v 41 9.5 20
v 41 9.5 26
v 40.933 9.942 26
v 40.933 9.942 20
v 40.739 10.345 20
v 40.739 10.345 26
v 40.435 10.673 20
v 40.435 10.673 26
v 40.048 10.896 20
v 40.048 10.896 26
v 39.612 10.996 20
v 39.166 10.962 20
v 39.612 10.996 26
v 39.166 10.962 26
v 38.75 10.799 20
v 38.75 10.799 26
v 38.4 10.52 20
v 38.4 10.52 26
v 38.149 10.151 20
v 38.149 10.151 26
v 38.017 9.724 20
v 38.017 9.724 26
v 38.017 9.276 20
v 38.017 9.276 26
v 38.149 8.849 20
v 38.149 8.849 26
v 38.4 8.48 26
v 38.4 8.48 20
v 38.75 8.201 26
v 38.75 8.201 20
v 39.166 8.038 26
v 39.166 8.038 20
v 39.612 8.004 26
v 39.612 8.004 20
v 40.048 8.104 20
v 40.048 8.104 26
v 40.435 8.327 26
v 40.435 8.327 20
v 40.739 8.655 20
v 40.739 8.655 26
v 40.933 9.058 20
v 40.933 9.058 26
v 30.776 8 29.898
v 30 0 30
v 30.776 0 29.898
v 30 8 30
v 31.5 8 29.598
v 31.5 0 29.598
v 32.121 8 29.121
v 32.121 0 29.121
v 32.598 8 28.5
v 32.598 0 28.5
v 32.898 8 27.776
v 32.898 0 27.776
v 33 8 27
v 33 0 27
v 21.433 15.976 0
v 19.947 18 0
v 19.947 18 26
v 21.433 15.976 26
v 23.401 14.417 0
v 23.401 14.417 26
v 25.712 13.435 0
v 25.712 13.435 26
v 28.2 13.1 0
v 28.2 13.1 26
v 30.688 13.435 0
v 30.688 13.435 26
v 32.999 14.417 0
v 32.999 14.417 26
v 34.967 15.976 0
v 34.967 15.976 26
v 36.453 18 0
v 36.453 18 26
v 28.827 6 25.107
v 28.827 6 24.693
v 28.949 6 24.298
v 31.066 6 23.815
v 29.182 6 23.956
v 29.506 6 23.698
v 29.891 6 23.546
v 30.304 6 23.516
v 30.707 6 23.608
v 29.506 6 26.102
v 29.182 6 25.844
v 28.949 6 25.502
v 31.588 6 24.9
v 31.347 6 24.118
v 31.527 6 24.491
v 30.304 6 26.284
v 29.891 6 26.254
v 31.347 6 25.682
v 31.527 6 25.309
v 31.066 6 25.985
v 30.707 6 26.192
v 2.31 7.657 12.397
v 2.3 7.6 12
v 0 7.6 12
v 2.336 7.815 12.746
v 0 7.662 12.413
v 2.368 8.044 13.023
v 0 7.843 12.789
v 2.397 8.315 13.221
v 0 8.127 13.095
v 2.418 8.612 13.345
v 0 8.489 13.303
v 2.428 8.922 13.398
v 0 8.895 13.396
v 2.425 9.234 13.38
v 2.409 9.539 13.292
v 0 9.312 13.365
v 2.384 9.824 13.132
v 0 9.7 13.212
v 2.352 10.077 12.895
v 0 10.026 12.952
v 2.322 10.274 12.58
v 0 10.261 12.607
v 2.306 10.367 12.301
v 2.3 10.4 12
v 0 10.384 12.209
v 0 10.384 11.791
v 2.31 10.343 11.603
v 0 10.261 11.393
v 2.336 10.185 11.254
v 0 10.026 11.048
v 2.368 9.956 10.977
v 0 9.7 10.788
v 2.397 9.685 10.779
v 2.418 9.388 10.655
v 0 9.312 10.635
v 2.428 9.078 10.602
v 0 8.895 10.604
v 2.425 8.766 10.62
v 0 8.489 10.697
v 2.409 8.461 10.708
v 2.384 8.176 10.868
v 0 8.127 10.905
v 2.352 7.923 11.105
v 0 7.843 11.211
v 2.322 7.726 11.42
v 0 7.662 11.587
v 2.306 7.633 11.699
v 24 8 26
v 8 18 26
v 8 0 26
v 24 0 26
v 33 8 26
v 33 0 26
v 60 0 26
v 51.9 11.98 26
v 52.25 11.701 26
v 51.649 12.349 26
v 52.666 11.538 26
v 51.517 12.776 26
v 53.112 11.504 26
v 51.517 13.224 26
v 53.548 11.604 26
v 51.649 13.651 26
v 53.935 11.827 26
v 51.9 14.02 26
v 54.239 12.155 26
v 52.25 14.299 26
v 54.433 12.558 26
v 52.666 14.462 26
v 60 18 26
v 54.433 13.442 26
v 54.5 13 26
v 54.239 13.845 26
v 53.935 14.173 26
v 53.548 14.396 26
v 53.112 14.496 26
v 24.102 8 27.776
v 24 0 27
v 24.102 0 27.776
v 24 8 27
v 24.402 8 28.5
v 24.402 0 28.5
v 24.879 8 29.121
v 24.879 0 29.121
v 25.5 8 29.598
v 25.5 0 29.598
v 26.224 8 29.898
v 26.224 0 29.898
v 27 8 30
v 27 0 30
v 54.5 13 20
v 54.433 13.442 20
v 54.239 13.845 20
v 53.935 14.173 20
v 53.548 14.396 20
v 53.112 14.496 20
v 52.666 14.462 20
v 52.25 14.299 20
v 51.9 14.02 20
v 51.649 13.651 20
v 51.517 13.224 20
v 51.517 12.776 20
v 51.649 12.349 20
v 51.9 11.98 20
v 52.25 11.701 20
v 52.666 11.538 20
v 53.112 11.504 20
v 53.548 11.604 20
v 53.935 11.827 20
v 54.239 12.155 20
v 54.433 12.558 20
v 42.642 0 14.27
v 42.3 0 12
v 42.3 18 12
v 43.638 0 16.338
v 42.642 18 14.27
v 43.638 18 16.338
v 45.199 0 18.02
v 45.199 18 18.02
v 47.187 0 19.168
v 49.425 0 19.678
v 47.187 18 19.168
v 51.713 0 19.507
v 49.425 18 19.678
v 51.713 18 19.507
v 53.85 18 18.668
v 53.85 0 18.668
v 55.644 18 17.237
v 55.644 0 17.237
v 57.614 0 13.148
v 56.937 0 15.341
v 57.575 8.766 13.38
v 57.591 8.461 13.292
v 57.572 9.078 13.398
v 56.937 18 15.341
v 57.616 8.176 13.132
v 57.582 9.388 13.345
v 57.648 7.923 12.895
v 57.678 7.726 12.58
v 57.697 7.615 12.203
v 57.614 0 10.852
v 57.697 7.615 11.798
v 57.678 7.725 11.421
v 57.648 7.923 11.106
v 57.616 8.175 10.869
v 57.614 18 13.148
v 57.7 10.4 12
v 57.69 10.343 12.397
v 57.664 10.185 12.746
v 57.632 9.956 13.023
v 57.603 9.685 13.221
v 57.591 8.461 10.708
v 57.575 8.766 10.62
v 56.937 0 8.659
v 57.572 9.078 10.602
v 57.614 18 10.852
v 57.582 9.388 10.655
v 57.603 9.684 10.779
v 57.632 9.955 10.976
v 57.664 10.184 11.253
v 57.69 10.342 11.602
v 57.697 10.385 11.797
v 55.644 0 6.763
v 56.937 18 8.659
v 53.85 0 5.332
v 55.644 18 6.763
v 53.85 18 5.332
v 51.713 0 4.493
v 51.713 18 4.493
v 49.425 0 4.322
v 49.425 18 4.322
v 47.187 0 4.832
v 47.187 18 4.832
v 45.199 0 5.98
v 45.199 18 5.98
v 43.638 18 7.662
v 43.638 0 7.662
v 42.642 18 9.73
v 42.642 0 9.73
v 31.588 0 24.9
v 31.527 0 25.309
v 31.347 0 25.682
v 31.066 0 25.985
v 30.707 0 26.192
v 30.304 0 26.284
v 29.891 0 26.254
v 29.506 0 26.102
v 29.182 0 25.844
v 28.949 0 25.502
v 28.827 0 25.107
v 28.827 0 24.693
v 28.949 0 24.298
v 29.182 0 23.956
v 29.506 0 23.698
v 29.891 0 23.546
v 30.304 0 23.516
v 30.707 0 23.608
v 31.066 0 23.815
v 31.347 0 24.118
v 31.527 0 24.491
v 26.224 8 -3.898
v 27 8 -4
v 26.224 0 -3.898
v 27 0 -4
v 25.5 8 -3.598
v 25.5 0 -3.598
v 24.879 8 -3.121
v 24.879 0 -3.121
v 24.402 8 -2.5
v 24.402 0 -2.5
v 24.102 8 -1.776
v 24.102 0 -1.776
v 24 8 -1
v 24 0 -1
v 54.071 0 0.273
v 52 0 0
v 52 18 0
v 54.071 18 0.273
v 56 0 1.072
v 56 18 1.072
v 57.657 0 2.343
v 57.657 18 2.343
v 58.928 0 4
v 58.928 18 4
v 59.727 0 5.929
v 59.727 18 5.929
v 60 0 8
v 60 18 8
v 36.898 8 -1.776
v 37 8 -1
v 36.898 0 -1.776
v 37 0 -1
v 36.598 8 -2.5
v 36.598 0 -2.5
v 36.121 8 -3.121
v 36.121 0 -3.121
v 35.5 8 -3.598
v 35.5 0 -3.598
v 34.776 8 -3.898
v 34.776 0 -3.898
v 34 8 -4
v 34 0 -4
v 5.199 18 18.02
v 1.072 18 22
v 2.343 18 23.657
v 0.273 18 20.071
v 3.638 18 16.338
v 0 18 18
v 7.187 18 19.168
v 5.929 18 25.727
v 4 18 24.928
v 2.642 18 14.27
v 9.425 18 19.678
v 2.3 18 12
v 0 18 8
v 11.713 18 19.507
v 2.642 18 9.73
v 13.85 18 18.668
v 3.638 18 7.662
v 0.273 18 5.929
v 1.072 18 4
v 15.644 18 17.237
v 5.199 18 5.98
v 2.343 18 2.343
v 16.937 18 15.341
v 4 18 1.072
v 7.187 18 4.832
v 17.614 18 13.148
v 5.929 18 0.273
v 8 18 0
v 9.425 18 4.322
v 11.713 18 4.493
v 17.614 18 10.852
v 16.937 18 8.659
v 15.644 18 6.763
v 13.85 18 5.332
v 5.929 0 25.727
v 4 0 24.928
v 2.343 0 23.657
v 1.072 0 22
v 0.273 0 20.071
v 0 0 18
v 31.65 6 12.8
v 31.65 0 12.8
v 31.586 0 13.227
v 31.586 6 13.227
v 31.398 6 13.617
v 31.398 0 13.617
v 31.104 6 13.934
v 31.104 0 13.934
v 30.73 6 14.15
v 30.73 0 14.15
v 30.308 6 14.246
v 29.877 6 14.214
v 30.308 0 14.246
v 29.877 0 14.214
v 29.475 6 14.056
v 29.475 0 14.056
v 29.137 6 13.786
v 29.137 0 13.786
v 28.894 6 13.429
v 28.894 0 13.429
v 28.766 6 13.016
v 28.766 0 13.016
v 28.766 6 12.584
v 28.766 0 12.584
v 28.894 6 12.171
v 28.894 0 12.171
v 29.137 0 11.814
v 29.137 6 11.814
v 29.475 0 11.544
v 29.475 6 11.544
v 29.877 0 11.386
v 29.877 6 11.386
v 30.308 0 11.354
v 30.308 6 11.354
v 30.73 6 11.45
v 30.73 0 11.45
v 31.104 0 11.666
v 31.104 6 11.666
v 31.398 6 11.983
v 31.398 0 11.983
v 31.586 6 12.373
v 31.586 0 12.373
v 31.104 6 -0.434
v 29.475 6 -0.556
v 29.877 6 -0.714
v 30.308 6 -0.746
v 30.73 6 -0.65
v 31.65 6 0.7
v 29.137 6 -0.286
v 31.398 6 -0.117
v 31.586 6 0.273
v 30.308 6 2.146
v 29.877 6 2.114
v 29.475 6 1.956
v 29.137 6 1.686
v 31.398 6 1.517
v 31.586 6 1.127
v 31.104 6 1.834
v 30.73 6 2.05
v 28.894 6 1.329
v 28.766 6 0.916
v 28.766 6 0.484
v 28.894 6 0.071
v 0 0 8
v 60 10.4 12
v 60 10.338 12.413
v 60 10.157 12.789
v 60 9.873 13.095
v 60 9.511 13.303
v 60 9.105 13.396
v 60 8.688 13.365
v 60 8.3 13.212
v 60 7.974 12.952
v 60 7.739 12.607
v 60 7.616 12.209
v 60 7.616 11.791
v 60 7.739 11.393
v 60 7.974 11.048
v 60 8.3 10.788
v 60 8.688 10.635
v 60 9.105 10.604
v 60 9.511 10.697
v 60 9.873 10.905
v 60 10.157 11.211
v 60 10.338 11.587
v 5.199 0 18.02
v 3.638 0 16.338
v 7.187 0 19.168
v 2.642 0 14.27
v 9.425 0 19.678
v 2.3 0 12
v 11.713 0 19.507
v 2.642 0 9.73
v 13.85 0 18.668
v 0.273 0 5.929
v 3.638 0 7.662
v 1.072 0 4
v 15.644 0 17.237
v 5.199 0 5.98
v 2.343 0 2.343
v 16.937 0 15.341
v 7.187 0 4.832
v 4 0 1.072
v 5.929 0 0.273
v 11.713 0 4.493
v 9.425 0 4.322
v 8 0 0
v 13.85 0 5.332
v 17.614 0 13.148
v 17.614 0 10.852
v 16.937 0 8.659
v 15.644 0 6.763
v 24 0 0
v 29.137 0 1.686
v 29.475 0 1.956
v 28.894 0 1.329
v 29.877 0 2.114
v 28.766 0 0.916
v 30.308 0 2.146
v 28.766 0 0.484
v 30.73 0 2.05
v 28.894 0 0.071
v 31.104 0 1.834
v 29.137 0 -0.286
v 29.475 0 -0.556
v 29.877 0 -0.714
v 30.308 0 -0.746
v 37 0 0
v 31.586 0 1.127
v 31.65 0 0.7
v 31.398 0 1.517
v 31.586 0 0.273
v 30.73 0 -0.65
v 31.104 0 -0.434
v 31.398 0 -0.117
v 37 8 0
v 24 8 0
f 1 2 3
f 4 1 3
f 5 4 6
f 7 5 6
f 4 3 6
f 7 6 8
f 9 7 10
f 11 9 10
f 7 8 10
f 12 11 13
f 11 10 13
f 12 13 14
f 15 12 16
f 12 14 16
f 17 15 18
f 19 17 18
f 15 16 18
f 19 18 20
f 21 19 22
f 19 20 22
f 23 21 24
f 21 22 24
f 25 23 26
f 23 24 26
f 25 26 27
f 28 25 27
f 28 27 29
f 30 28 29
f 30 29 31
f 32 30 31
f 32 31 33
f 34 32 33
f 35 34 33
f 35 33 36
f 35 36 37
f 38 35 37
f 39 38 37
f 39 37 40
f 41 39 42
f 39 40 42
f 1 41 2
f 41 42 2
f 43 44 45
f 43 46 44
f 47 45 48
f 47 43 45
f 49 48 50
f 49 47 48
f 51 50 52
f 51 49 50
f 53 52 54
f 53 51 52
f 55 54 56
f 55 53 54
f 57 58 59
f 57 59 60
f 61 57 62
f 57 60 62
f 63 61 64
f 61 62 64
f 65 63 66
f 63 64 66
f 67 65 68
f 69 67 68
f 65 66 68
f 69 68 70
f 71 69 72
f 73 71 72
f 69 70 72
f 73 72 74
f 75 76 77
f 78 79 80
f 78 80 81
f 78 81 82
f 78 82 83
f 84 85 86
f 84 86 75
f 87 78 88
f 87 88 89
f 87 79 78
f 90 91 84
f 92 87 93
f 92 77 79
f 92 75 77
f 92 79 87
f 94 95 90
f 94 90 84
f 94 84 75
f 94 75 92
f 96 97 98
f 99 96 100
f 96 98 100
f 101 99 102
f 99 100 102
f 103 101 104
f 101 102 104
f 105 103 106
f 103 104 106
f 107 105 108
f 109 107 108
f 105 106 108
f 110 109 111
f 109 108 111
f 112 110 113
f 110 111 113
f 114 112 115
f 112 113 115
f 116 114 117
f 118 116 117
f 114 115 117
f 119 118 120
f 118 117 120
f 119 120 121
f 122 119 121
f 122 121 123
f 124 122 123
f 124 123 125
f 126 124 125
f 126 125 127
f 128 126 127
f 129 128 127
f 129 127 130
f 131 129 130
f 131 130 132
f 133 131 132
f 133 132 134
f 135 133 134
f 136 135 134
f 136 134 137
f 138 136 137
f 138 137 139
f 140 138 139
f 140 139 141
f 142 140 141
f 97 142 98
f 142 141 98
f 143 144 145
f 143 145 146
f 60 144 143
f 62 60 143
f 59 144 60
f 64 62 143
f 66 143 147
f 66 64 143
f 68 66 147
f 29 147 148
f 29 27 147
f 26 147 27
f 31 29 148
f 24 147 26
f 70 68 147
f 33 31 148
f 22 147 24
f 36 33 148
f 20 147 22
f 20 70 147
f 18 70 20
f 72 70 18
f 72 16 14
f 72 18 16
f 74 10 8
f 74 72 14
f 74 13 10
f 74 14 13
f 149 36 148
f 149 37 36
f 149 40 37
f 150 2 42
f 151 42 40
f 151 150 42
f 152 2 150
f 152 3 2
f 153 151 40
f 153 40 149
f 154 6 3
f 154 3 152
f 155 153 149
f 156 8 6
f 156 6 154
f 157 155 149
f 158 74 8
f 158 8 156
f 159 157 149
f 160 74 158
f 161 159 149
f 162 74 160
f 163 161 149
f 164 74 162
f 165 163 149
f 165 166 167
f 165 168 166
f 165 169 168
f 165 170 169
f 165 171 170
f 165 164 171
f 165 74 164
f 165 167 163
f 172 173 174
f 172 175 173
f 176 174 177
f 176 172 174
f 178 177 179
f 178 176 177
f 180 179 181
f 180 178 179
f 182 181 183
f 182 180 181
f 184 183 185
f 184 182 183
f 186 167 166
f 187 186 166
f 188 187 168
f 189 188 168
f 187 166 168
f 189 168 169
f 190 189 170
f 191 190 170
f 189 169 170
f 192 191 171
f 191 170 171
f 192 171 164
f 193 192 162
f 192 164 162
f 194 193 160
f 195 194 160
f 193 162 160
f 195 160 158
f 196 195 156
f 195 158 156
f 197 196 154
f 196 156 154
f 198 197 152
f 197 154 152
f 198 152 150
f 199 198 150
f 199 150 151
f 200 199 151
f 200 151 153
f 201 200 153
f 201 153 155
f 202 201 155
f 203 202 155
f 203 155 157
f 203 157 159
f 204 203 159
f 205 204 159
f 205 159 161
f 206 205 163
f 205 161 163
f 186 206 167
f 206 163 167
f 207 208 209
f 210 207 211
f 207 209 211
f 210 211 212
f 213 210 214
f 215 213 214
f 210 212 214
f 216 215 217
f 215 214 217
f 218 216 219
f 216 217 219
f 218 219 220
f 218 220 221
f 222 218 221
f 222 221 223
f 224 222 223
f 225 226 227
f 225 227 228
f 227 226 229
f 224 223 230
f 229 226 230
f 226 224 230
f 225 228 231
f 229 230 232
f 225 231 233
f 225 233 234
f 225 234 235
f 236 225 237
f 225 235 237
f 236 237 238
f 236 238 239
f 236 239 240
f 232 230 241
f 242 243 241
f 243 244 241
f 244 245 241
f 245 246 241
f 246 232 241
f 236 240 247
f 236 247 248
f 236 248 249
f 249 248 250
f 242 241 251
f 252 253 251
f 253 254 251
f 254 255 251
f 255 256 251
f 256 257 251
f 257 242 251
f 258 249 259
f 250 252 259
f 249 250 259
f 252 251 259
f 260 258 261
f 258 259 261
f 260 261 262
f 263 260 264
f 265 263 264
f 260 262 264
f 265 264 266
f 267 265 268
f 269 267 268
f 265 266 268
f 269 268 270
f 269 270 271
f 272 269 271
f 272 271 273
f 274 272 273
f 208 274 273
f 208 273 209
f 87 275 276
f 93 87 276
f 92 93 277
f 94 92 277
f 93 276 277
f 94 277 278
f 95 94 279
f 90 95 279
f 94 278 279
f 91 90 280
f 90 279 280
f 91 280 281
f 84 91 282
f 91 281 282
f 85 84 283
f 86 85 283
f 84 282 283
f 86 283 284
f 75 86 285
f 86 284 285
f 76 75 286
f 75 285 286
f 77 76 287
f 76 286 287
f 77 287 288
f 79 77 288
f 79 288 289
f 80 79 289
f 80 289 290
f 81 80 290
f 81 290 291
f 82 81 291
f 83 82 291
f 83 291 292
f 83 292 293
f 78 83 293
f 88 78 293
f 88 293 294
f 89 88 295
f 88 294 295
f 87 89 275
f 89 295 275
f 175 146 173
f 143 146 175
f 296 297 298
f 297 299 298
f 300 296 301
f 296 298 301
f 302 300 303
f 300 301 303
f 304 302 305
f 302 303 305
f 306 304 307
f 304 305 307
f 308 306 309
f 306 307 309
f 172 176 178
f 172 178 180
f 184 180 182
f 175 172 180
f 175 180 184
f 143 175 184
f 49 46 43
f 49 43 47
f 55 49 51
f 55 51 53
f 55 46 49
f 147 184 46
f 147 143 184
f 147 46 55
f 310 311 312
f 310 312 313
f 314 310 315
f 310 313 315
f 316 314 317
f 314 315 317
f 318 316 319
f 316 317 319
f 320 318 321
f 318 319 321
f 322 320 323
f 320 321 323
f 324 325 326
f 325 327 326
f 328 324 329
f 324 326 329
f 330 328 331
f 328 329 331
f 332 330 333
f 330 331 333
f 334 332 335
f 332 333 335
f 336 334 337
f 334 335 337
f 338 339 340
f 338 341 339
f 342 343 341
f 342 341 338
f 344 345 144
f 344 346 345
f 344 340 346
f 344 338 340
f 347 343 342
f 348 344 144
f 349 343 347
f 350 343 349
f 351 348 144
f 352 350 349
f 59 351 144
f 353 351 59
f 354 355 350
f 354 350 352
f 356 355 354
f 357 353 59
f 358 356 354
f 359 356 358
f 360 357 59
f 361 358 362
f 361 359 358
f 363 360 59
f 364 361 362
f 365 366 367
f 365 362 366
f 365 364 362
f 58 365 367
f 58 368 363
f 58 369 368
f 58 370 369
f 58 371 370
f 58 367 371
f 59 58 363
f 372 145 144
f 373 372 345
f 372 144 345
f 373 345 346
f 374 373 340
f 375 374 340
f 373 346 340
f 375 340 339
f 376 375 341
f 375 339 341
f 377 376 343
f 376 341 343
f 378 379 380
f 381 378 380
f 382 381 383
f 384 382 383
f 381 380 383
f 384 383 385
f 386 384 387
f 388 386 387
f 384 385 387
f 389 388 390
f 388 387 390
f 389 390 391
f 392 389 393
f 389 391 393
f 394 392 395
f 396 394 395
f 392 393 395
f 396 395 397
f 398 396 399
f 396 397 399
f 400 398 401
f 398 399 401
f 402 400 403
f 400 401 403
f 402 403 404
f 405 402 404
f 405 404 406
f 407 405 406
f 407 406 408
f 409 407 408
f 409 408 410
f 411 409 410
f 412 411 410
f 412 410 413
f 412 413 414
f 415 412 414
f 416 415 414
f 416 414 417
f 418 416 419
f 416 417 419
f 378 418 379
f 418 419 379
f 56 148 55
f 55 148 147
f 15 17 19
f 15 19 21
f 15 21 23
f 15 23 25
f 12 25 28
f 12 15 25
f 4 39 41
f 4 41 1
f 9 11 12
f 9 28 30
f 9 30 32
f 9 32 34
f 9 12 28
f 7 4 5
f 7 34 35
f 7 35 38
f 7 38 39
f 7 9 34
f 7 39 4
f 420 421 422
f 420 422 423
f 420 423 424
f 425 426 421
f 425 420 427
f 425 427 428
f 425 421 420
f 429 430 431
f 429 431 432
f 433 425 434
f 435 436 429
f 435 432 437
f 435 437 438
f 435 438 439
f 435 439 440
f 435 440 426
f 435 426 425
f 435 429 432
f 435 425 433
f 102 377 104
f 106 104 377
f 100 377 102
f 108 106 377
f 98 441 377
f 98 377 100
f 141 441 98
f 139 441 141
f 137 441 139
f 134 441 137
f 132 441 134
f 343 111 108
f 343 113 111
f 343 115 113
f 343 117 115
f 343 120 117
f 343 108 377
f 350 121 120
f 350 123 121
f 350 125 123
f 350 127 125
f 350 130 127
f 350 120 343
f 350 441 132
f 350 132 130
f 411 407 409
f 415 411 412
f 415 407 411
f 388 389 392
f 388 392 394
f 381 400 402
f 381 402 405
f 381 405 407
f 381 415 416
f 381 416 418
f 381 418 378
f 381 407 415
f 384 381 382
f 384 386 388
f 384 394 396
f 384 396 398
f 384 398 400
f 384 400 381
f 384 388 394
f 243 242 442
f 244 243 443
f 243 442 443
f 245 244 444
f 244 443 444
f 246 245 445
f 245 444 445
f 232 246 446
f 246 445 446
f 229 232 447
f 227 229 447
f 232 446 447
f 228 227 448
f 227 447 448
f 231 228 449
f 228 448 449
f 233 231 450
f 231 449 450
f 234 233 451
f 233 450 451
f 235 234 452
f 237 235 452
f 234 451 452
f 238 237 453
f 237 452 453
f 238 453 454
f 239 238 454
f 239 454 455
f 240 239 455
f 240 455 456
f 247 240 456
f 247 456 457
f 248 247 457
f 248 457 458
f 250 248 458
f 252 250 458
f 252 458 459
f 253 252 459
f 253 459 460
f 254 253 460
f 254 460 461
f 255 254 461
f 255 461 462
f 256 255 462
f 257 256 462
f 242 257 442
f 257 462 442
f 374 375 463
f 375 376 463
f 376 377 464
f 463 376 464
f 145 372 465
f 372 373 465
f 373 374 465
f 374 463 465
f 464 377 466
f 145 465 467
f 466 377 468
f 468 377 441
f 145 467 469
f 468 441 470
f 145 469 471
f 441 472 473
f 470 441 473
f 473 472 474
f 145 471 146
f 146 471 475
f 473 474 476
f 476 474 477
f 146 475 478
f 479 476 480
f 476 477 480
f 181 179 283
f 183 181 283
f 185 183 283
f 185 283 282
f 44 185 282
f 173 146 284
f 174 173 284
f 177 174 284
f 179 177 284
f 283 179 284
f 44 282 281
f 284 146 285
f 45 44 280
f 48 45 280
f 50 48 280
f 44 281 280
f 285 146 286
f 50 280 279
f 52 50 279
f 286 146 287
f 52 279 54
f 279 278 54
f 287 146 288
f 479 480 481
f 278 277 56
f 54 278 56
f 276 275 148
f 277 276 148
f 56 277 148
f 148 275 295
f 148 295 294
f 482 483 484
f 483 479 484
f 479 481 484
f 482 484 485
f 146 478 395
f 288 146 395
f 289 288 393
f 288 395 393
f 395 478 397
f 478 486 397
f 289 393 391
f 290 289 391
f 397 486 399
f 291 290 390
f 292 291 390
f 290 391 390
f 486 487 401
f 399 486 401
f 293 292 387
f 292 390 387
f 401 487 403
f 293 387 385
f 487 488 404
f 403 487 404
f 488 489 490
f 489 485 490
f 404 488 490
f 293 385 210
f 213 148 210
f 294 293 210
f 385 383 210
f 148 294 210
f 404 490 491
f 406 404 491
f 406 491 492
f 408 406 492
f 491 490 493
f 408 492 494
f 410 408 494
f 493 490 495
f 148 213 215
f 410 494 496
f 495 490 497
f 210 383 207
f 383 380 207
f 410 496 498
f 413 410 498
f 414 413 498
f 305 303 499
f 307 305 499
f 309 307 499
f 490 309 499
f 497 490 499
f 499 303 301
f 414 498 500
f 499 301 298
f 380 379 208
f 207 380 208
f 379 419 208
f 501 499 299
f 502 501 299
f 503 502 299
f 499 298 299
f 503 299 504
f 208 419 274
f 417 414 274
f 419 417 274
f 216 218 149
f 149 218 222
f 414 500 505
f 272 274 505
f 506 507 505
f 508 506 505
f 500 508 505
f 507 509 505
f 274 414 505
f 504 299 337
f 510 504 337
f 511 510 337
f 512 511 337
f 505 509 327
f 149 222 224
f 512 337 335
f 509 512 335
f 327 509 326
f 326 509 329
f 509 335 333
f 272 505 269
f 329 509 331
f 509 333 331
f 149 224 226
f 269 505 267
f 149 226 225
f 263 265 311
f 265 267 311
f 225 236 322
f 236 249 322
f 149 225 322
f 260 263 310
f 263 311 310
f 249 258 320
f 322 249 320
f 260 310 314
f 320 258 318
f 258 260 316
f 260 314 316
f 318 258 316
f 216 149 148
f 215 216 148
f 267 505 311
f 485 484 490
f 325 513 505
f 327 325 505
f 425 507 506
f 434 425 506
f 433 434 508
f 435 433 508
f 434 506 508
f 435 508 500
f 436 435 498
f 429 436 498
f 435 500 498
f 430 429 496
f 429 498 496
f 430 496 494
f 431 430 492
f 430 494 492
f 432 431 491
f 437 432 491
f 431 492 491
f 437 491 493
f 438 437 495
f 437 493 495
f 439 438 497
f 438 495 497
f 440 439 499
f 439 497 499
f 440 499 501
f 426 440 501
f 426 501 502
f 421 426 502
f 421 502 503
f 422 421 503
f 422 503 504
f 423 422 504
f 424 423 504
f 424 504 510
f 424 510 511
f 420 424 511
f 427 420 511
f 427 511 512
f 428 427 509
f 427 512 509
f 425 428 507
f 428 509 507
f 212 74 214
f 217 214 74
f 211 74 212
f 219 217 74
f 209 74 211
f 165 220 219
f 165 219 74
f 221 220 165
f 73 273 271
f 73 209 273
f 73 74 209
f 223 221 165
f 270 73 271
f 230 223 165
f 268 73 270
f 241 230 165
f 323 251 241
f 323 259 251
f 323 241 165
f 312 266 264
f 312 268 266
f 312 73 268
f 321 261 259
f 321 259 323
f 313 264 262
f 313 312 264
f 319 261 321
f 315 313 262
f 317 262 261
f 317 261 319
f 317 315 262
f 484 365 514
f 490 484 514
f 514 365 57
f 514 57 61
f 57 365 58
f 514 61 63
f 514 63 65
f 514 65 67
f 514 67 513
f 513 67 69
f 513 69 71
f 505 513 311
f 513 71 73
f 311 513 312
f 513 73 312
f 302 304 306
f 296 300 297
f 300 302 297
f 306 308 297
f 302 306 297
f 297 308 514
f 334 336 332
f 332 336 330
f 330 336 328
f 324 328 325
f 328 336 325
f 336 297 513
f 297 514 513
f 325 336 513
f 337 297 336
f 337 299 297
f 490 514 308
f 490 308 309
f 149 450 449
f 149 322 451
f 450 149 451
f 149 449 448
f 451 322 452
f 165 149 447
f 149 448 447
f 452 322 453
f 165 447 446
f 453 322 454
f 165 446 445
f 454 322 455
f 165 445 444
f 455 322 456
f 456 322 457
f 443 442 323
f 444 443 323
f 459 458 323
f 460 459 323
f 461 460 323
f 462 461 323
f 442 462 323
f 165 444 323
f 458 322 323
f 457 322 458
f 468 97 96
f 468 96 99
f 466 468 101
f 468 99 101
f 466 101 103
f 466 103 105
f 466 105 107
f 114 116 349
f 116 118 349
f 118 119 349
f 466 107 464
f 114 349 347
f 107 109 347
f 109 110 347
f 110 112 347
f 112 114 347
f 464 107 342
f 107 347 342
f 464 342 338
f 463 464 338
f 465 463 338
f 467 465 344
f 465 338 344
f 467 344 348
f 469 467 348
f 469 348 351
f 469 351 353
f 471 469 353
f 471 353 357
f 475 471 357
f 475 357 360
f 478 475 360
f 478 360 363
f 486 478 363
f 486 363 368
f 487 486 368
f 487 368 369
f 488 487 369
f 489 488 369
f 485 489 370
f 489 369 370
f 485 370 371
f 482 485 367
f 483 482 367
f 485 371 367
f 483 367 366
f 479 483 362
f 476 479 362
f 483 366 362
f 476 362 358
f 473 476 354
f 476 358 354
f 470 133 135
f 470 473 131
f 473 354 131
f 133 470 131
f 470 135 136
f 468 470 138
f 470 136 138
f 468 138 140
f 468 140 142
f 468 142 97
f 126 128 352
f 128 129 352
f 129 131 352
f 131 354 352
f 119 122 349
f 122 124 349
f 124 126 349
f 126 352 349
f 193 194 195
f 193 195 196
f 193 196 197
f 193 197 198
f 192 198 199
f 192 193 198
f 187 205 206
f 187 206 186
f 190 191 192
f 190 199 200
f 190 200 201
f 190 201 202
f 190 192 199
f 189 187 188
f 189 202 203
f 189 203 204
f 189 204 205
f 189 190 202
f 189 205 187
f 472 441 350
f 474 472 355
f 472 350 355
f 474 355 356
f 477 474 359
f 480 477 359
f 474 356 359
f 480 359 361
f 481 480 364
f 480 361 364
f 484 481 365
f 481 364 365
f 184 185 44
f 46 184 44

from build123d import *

# Parameters (mm, degrees)
BOX_W           = 60
BOX_H           = 18
BOX_DEPTH       = 26
SKETCH003_R     = 7.7
POCKET_DEPTH    = 18.001
SKETCH004_R     = 1.4
POCKET001_DEPTH = 5
SKETCH002_R     = 1.5
POCKET002_DEPTH = 6
SKETCH005_R     = 1.4
POCKET003_DEPTH = 5
SKETCH017_W     = 13
SKETCH017_H     = 8
PAD_DEPTH       = 4
SKETCH018_W     = 9
SKETCH018_H     = 8
PAD001_DEPTH    = 4
SKETCH008_R     = 9.4
POCKET015_DEPTH = 34.001
FILLET_R        = 3
SKETCH007_R     = 1.45
SKETCH007_R_2   = 1.388343
POCKET016_DEPTH = 6
FILLET002_R     = 8


with BuildPart() as part:
    # Box → Box (new body)
    with BuildSketch(Plane.XY):
        with Locations((30, 9)):
            Rectangle(BOX_W, BOX_H)
    extrude(amount=BOX_DEPTH)

    # Sketch003 → Pocket (cut, through all)
    with BuildSketch(Plane(origin=(0, 18, 0), x_dir=(-1, 0, 0), z_dir=(0, 1, 0))):
        with Locations((-50, 12)):
            Circle(SKETCH003_R)
        with Locations((-10, 12)):
            Circle(SKETCH003_R)
    extrude(amount=-POCKET_DEPTH, mode=Mode.SUBTRACT)

    # Sketch004 → Pocket001 (cut)
    with BuildSketch(Plane.YZ.offset(60)):
        with Locations((9, 12)):
            Circle(SKETCH004_R)
    extrude(amount=-POCKET001_DEPTH, mode=Mode.SUBTRACT)

    # Sketch002 → Pocket002 (cut)
    with BuildSketch(Plane.XY.offset(26)):
        with Locations((39.5, 9.5)):
            Circle(SKETCH002_R)
        with Locations((53, 13)):
            Circle(SKETCH002_R)
    extrude(amount=-POCKET002_DEPTH, mode=Mode.SUBTRACT)

    # Sketch005 → Pocket003 (cut)
    with BuildSketch(Plane(origin=(0, 0, 0), x_dir=(0, -1, 0), z_dir=(-1, 0, 0))):
        with Locations((-9, 12)):
            Circle(SKETCH005_R)
    extrude(amount=-POCKET003_DEPTH, mode=Mode.SUBTRACT)

    # Sketch017 → Pad (new body)
    with BuildSketch(Plane(origin=(0, 0, 0), x_dir=(1, 0, 0), z_dir=(0, 0, -1))):
        with Locations((30.5, -4)):
            Rectangle(SKETCH017_W, SKETCH017_H)
    extrude(amount=PAD_DEPTH)

    # Sketch018 → Pad001 (new body)
    with BuildSketch(Plane.XY.offset(26)):
        with Locations((28.5, 4)):
            Rectangle(SKETCH018_W, SKETCH018_H)
    extrude(amount=PAD001_DEPTH)

    # Sketch008 → Pocket015 (cut, through all)
    with BuildSketch(Plane.XY.offset(30)):
        with Locations((28.2, 22.5)):
            Circle(SKETCH008_R)
    extrude(amount=-POCKET015_DEPTH, mode=Mode.SUBTRACT)

    # Fillet
    fillet_edges = [part.edges().sort_by_distance(p)[0] for p in [
        (24, 4, 30),
        (33, 4, 30),
        (37, 4, -4),
        (24, 4, -4),
    ]]
    fillet(fillet_edges, radius=FILLET_R)

    # Sketch007 → Pocket016 (cut)
    with BuildSketch(Plane.XZ):
        with Locations((30.2, 12.8)):
            Circle(SKETCH007_R)
        with Locations((30.2, 0.7)):
            Circle(SKETCH007_R)
        with Locations((30.2, 24.9)):
            Circle(SKETCH007_R_2)
    extrude(amount=-POCKET016_DEPTH, mode=Mode.SUBTRACT)

    # Fillet002
    fillet002_edges = [part.edges().sort_by_distance(p)[0] for p in [
        (0, 9, 26),
        (0, 9, 0),
        (60, 9, 0),
    ]]
    fillet(fillet002_edges, radius=FILLET002_R)


solid = part.part
